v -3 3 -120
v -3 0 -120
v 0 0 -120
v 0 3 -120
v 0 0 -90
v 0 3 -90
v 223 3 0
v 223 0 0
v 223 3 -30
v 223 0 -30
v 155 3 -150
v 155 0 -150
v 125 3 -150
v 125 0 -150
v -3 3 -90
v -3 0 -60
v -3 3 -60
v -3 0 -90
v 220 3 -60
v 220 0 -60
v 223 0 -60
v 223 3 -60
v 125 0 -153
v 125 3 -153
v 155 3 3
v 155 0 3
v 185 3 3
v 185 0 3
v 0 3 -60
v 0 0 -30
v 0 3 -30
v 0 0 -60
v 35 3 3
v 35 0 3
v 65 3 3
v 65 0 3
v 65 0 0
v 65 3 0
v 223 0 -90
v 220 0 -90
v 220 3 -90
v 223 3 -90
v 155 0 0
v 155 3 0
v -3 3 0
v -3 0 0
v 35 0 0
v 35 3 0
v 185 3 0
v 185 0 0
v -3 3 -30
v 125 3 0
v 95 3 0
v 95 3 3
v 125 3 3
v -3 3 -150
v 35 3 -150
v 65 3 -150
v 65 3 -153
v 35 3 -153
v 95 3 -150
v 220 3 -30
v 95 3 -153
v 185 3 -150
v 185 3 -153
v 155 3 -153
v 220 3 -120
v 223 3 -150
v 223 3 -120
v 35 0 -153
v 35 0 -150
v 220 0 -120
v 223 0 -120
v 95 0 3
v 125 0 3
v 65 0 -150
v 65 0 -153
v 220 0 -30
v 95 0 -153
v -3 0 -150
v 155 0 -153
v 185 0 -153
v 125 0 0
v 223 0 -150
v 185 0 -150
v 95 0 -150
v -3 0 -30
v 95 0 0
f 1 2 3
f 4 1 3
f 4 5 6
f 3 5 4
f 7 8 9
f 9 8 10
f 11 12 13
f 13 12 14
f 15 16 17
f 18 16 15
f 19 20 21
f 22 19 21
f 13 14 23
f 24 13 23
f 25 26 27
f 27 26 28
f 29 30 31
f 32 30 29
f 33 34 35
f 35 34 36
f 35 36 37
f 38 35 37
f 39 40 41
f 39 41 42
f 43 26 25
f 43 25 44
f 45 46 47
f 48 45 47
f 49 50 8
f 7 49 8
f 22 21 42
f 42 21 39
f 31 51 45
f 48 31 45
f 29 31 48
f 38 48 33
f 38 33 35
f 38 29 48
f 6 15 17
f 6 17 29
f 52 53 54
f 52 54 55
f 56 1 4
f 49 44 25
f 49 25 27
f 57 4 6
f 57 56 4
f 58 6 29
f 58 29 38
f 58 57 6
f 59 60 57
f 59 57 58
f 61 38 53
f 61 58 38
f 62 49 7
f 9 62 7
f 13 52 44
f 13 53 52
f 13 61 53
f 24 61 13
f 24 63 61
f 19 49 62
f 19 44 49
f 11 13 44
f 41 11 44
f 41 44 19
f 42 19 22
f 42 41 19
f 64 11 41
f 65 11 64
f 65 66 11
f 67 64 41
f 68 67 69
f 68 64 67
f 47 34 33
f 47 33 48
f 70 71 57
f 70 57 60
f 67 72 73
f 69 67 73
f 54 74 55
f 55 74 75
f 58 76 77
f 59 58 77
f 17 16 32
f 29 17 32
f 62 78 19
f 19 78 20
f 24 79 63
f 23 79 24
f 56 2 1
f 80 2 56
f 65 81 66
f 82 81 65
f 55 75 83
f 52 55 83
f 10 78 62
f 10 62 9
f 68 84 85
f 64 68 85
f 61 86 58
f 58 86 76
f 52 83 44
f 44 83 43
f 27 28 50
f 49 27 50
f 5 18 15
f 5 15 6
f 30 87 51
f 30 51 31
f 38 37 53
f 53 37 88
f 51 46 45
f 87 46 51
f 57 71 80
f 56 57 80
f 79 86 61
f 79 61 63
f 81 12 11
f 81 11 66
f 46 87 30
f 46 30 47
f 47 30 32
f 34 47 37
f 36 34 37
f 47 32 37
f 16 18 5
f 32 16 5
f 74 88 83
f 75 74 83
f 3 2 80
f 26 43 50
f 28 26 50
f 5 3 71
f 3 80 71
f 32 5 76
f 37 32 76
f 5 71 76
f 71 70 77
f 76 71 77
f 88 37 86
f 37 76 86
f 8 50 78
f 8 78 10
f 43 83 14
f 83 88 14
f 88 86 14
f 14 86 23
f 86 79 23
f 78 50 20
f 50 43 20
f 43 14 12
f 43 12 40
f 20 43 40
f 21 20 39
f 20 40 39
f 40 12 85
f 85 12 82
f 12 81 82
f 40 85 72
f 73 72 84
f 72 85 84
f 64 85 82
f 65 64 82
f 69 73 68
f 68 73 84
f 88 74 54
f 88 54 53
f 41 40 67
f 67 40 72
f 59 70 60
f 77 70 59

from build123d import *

# Parameters (mm, degrees)
SKETCH1_W           = 220
SKETCH1_H           = 150
SKETCH1_W_2         = 3
SKETCH1_H_2         = 30
SKETCH1_W_3         = 30
SKETCH1_H_3         = 3
BOSS_EXTRUDE1_DEPTH = 3


with BuildPart() as part:
    # Sketch1 → Boss-Extrude1 (new body)
    with BuildSketch(Plane(origin=(0, 0, 0), x_dir=(1, 0, 0), z_dir=(0, 1, 0))):
        with Locations((110, 75)):
            Rectangle(SKETCH1_W, SKETCH1_H)
        with Locations((-1.5, 15)):
            Rectangle(SKETCH1_W_2, SKETCH1_H_2)
        with Locations((-1.5, 75)):
            Rectangle(SKETCH1_W_2, SKETCH1_H_2)
        with Locations((-1.5, 135)):
            Rectangle(SKETCH1_W_2, SKETCH1_H_2)
        with Locations((50, 151.5)):
            Rectangle(SKETCH1_W_3, SKETCH1_H_3)
        with Locations((110, 151.5)):
            Rectangle(SKETCH1_W_3, SKETCH1_H_3)
        with Locations((170, 151.5)):
            Rectangle(SKETCH1_W_3, SKETCH1_H_3)
        with Locations((221.5, 135)):
            Rectangle(SKETCH1_W_2, SKETCH1_H_2)
        with Locations((221.5, 75)):
            Rectangle(SKETCH1_W_2, SKETCH1_H_2)
        with Locations((221.5, 15)):
            Rectangle(SKETCH1_W_2, SKETCH1_H_2)
        with Locations((170, -1.5)):
            Rectangle(SKETCH1_W_3, SKETCH1_H_3)
        with Locations((110, -1.5)):
            Rectangle(SKETCH1_W_3, SKETCH1_H_3)
        with Locations((50, -1.5)):
            Rectangle(SKETCH1_W_3, SKETCH1_H_3)
    extrude(amount=BOSS_EXTRUDE1_DEPTH)


solid = part.part
